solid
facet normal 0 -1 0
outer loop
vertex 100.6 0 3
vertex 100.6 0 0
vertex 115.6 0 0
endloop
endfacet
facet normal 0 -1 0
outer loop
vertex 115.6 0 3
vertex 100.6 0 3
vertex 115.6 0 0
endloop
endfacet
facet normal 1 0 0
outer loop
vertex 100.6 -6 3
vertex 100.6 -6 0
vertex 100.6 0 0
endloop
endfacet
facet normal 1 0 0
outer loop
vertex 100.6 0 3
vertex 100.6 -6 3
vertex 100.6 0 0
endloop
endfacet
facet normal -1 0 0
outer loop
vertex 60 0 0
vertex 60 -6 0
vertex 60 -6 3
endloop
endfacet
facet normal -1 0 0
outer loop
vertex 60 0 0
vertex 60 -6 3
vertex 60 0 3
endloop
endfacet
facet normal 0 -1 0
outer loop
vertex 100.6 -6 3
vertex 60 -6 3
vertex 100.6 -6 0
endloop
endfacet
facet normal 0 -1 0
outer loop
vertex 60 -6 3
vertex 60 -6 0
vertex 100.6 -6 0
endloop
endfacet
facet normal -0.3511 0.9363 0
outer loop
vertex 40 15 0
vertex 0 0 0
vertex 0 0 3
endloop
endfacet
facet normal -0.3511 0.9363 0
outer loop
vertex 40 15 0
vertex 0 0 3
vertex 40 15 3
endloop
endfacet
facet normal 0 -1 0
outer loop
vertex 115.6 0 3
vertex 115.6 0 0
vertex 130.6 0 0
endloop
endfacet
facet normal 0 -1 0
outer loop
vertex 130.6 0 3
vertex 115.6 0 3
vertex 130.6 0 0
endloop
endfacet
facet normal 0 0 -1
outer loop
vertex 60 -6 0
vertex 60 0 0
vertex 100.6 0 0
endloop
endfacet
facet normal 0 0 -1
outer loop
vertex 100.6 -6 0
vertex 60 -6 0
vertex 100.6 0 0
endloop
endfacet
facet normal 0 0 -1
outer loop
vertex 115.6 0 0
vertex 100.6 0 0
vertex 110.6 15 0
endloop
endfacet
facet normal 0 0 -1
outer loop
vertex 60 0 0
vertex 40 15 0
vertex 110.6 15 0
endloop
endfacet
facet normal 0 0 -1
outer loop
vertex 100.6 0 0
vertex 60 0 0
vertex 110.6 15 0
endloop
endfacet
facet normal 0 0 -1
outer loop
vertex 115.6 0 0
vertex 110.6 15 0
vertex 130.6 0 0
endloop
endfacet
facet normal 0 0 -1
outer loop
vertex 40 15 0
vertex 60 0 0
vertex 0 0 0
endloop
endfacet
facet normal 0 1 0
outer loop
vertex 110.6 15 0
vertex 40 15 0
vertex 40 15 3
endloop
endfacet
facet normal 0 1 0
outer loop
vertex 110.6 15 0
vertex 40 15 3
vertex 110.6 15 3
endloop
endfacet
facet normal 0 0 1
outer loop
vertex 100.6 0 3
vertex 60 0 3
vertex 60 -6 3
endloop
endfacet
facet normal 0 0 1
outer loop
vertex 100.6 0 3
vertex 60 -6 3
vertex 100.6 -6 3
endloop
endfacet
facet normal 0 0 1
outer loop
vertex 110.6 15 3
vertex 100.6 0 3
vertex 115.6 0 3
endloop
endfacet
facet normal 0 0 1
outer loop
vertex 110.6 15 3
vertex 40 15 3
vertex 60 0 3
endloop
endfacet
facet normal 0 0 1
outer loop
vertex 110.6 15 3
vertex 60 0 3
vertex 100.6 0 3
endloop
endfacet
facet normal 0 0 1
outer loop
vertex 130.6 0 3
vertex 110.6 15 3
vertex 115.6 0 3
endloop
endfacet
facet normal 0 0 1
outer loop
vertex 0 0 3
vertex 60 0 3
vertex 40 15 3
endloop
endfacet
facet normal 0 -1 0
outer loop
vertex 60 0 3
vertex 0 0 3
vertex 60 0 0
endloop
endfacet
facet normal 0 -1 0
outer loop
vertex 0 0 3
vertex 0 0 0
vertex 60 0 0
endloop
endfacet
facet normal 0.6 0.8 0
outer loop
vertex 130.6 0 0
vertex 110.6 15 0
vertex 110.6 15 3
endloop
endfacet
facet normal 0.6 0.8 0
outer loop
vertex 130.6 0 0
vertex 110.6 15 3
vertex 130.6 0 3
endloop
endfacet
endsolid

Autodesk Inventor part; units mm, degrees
ref_plane "YZ Plane" through (0, 0, 0) normal (1, 0, 0) x (0, 1, 0)
ref_plane "XZ Plane" through (0, 0, 0) normal (0, 1, 0) x (-1, 0, 0)
ref_plane "XY Plane" through (0, 0, 0) normal (0, 0, 1) x (1, 0, 0)
sketch "Sketch1" plane through (0, 0, 0) normal (0, 0, 1) x (1, 0, 0)
  line L0 (60, -6) -> (60, 0)
  line L1 (100.6, 0) -> (115.6, 0)
  line L2 (0, 0) -> (60, 0)
  line L3 (100.6, 0) -> (130.6, 0)
  line L4 (60, -6) -> (100.6, -6)
  line L5 (100.6, -6) -> (100.6, 0)
  line L6 (0, 0) -> (40, 15)
  line L7 (40, 15) -> (110.6, 15)
  line L8 (110.6, 15) -> (130.6, 0)
  dimension "d24" = 6
  dimension "d26" = 60
  dimension "d27" = 40.6
  dimension "d28" = 30
  dimension "d29" = 15
  dimension "d30" = 40
  dimension "d31" = 20
extrude "Extrusion1" add sketch "Sketch1" along normal blind 3
properties part number "Moving Ramp Inside Rail"
